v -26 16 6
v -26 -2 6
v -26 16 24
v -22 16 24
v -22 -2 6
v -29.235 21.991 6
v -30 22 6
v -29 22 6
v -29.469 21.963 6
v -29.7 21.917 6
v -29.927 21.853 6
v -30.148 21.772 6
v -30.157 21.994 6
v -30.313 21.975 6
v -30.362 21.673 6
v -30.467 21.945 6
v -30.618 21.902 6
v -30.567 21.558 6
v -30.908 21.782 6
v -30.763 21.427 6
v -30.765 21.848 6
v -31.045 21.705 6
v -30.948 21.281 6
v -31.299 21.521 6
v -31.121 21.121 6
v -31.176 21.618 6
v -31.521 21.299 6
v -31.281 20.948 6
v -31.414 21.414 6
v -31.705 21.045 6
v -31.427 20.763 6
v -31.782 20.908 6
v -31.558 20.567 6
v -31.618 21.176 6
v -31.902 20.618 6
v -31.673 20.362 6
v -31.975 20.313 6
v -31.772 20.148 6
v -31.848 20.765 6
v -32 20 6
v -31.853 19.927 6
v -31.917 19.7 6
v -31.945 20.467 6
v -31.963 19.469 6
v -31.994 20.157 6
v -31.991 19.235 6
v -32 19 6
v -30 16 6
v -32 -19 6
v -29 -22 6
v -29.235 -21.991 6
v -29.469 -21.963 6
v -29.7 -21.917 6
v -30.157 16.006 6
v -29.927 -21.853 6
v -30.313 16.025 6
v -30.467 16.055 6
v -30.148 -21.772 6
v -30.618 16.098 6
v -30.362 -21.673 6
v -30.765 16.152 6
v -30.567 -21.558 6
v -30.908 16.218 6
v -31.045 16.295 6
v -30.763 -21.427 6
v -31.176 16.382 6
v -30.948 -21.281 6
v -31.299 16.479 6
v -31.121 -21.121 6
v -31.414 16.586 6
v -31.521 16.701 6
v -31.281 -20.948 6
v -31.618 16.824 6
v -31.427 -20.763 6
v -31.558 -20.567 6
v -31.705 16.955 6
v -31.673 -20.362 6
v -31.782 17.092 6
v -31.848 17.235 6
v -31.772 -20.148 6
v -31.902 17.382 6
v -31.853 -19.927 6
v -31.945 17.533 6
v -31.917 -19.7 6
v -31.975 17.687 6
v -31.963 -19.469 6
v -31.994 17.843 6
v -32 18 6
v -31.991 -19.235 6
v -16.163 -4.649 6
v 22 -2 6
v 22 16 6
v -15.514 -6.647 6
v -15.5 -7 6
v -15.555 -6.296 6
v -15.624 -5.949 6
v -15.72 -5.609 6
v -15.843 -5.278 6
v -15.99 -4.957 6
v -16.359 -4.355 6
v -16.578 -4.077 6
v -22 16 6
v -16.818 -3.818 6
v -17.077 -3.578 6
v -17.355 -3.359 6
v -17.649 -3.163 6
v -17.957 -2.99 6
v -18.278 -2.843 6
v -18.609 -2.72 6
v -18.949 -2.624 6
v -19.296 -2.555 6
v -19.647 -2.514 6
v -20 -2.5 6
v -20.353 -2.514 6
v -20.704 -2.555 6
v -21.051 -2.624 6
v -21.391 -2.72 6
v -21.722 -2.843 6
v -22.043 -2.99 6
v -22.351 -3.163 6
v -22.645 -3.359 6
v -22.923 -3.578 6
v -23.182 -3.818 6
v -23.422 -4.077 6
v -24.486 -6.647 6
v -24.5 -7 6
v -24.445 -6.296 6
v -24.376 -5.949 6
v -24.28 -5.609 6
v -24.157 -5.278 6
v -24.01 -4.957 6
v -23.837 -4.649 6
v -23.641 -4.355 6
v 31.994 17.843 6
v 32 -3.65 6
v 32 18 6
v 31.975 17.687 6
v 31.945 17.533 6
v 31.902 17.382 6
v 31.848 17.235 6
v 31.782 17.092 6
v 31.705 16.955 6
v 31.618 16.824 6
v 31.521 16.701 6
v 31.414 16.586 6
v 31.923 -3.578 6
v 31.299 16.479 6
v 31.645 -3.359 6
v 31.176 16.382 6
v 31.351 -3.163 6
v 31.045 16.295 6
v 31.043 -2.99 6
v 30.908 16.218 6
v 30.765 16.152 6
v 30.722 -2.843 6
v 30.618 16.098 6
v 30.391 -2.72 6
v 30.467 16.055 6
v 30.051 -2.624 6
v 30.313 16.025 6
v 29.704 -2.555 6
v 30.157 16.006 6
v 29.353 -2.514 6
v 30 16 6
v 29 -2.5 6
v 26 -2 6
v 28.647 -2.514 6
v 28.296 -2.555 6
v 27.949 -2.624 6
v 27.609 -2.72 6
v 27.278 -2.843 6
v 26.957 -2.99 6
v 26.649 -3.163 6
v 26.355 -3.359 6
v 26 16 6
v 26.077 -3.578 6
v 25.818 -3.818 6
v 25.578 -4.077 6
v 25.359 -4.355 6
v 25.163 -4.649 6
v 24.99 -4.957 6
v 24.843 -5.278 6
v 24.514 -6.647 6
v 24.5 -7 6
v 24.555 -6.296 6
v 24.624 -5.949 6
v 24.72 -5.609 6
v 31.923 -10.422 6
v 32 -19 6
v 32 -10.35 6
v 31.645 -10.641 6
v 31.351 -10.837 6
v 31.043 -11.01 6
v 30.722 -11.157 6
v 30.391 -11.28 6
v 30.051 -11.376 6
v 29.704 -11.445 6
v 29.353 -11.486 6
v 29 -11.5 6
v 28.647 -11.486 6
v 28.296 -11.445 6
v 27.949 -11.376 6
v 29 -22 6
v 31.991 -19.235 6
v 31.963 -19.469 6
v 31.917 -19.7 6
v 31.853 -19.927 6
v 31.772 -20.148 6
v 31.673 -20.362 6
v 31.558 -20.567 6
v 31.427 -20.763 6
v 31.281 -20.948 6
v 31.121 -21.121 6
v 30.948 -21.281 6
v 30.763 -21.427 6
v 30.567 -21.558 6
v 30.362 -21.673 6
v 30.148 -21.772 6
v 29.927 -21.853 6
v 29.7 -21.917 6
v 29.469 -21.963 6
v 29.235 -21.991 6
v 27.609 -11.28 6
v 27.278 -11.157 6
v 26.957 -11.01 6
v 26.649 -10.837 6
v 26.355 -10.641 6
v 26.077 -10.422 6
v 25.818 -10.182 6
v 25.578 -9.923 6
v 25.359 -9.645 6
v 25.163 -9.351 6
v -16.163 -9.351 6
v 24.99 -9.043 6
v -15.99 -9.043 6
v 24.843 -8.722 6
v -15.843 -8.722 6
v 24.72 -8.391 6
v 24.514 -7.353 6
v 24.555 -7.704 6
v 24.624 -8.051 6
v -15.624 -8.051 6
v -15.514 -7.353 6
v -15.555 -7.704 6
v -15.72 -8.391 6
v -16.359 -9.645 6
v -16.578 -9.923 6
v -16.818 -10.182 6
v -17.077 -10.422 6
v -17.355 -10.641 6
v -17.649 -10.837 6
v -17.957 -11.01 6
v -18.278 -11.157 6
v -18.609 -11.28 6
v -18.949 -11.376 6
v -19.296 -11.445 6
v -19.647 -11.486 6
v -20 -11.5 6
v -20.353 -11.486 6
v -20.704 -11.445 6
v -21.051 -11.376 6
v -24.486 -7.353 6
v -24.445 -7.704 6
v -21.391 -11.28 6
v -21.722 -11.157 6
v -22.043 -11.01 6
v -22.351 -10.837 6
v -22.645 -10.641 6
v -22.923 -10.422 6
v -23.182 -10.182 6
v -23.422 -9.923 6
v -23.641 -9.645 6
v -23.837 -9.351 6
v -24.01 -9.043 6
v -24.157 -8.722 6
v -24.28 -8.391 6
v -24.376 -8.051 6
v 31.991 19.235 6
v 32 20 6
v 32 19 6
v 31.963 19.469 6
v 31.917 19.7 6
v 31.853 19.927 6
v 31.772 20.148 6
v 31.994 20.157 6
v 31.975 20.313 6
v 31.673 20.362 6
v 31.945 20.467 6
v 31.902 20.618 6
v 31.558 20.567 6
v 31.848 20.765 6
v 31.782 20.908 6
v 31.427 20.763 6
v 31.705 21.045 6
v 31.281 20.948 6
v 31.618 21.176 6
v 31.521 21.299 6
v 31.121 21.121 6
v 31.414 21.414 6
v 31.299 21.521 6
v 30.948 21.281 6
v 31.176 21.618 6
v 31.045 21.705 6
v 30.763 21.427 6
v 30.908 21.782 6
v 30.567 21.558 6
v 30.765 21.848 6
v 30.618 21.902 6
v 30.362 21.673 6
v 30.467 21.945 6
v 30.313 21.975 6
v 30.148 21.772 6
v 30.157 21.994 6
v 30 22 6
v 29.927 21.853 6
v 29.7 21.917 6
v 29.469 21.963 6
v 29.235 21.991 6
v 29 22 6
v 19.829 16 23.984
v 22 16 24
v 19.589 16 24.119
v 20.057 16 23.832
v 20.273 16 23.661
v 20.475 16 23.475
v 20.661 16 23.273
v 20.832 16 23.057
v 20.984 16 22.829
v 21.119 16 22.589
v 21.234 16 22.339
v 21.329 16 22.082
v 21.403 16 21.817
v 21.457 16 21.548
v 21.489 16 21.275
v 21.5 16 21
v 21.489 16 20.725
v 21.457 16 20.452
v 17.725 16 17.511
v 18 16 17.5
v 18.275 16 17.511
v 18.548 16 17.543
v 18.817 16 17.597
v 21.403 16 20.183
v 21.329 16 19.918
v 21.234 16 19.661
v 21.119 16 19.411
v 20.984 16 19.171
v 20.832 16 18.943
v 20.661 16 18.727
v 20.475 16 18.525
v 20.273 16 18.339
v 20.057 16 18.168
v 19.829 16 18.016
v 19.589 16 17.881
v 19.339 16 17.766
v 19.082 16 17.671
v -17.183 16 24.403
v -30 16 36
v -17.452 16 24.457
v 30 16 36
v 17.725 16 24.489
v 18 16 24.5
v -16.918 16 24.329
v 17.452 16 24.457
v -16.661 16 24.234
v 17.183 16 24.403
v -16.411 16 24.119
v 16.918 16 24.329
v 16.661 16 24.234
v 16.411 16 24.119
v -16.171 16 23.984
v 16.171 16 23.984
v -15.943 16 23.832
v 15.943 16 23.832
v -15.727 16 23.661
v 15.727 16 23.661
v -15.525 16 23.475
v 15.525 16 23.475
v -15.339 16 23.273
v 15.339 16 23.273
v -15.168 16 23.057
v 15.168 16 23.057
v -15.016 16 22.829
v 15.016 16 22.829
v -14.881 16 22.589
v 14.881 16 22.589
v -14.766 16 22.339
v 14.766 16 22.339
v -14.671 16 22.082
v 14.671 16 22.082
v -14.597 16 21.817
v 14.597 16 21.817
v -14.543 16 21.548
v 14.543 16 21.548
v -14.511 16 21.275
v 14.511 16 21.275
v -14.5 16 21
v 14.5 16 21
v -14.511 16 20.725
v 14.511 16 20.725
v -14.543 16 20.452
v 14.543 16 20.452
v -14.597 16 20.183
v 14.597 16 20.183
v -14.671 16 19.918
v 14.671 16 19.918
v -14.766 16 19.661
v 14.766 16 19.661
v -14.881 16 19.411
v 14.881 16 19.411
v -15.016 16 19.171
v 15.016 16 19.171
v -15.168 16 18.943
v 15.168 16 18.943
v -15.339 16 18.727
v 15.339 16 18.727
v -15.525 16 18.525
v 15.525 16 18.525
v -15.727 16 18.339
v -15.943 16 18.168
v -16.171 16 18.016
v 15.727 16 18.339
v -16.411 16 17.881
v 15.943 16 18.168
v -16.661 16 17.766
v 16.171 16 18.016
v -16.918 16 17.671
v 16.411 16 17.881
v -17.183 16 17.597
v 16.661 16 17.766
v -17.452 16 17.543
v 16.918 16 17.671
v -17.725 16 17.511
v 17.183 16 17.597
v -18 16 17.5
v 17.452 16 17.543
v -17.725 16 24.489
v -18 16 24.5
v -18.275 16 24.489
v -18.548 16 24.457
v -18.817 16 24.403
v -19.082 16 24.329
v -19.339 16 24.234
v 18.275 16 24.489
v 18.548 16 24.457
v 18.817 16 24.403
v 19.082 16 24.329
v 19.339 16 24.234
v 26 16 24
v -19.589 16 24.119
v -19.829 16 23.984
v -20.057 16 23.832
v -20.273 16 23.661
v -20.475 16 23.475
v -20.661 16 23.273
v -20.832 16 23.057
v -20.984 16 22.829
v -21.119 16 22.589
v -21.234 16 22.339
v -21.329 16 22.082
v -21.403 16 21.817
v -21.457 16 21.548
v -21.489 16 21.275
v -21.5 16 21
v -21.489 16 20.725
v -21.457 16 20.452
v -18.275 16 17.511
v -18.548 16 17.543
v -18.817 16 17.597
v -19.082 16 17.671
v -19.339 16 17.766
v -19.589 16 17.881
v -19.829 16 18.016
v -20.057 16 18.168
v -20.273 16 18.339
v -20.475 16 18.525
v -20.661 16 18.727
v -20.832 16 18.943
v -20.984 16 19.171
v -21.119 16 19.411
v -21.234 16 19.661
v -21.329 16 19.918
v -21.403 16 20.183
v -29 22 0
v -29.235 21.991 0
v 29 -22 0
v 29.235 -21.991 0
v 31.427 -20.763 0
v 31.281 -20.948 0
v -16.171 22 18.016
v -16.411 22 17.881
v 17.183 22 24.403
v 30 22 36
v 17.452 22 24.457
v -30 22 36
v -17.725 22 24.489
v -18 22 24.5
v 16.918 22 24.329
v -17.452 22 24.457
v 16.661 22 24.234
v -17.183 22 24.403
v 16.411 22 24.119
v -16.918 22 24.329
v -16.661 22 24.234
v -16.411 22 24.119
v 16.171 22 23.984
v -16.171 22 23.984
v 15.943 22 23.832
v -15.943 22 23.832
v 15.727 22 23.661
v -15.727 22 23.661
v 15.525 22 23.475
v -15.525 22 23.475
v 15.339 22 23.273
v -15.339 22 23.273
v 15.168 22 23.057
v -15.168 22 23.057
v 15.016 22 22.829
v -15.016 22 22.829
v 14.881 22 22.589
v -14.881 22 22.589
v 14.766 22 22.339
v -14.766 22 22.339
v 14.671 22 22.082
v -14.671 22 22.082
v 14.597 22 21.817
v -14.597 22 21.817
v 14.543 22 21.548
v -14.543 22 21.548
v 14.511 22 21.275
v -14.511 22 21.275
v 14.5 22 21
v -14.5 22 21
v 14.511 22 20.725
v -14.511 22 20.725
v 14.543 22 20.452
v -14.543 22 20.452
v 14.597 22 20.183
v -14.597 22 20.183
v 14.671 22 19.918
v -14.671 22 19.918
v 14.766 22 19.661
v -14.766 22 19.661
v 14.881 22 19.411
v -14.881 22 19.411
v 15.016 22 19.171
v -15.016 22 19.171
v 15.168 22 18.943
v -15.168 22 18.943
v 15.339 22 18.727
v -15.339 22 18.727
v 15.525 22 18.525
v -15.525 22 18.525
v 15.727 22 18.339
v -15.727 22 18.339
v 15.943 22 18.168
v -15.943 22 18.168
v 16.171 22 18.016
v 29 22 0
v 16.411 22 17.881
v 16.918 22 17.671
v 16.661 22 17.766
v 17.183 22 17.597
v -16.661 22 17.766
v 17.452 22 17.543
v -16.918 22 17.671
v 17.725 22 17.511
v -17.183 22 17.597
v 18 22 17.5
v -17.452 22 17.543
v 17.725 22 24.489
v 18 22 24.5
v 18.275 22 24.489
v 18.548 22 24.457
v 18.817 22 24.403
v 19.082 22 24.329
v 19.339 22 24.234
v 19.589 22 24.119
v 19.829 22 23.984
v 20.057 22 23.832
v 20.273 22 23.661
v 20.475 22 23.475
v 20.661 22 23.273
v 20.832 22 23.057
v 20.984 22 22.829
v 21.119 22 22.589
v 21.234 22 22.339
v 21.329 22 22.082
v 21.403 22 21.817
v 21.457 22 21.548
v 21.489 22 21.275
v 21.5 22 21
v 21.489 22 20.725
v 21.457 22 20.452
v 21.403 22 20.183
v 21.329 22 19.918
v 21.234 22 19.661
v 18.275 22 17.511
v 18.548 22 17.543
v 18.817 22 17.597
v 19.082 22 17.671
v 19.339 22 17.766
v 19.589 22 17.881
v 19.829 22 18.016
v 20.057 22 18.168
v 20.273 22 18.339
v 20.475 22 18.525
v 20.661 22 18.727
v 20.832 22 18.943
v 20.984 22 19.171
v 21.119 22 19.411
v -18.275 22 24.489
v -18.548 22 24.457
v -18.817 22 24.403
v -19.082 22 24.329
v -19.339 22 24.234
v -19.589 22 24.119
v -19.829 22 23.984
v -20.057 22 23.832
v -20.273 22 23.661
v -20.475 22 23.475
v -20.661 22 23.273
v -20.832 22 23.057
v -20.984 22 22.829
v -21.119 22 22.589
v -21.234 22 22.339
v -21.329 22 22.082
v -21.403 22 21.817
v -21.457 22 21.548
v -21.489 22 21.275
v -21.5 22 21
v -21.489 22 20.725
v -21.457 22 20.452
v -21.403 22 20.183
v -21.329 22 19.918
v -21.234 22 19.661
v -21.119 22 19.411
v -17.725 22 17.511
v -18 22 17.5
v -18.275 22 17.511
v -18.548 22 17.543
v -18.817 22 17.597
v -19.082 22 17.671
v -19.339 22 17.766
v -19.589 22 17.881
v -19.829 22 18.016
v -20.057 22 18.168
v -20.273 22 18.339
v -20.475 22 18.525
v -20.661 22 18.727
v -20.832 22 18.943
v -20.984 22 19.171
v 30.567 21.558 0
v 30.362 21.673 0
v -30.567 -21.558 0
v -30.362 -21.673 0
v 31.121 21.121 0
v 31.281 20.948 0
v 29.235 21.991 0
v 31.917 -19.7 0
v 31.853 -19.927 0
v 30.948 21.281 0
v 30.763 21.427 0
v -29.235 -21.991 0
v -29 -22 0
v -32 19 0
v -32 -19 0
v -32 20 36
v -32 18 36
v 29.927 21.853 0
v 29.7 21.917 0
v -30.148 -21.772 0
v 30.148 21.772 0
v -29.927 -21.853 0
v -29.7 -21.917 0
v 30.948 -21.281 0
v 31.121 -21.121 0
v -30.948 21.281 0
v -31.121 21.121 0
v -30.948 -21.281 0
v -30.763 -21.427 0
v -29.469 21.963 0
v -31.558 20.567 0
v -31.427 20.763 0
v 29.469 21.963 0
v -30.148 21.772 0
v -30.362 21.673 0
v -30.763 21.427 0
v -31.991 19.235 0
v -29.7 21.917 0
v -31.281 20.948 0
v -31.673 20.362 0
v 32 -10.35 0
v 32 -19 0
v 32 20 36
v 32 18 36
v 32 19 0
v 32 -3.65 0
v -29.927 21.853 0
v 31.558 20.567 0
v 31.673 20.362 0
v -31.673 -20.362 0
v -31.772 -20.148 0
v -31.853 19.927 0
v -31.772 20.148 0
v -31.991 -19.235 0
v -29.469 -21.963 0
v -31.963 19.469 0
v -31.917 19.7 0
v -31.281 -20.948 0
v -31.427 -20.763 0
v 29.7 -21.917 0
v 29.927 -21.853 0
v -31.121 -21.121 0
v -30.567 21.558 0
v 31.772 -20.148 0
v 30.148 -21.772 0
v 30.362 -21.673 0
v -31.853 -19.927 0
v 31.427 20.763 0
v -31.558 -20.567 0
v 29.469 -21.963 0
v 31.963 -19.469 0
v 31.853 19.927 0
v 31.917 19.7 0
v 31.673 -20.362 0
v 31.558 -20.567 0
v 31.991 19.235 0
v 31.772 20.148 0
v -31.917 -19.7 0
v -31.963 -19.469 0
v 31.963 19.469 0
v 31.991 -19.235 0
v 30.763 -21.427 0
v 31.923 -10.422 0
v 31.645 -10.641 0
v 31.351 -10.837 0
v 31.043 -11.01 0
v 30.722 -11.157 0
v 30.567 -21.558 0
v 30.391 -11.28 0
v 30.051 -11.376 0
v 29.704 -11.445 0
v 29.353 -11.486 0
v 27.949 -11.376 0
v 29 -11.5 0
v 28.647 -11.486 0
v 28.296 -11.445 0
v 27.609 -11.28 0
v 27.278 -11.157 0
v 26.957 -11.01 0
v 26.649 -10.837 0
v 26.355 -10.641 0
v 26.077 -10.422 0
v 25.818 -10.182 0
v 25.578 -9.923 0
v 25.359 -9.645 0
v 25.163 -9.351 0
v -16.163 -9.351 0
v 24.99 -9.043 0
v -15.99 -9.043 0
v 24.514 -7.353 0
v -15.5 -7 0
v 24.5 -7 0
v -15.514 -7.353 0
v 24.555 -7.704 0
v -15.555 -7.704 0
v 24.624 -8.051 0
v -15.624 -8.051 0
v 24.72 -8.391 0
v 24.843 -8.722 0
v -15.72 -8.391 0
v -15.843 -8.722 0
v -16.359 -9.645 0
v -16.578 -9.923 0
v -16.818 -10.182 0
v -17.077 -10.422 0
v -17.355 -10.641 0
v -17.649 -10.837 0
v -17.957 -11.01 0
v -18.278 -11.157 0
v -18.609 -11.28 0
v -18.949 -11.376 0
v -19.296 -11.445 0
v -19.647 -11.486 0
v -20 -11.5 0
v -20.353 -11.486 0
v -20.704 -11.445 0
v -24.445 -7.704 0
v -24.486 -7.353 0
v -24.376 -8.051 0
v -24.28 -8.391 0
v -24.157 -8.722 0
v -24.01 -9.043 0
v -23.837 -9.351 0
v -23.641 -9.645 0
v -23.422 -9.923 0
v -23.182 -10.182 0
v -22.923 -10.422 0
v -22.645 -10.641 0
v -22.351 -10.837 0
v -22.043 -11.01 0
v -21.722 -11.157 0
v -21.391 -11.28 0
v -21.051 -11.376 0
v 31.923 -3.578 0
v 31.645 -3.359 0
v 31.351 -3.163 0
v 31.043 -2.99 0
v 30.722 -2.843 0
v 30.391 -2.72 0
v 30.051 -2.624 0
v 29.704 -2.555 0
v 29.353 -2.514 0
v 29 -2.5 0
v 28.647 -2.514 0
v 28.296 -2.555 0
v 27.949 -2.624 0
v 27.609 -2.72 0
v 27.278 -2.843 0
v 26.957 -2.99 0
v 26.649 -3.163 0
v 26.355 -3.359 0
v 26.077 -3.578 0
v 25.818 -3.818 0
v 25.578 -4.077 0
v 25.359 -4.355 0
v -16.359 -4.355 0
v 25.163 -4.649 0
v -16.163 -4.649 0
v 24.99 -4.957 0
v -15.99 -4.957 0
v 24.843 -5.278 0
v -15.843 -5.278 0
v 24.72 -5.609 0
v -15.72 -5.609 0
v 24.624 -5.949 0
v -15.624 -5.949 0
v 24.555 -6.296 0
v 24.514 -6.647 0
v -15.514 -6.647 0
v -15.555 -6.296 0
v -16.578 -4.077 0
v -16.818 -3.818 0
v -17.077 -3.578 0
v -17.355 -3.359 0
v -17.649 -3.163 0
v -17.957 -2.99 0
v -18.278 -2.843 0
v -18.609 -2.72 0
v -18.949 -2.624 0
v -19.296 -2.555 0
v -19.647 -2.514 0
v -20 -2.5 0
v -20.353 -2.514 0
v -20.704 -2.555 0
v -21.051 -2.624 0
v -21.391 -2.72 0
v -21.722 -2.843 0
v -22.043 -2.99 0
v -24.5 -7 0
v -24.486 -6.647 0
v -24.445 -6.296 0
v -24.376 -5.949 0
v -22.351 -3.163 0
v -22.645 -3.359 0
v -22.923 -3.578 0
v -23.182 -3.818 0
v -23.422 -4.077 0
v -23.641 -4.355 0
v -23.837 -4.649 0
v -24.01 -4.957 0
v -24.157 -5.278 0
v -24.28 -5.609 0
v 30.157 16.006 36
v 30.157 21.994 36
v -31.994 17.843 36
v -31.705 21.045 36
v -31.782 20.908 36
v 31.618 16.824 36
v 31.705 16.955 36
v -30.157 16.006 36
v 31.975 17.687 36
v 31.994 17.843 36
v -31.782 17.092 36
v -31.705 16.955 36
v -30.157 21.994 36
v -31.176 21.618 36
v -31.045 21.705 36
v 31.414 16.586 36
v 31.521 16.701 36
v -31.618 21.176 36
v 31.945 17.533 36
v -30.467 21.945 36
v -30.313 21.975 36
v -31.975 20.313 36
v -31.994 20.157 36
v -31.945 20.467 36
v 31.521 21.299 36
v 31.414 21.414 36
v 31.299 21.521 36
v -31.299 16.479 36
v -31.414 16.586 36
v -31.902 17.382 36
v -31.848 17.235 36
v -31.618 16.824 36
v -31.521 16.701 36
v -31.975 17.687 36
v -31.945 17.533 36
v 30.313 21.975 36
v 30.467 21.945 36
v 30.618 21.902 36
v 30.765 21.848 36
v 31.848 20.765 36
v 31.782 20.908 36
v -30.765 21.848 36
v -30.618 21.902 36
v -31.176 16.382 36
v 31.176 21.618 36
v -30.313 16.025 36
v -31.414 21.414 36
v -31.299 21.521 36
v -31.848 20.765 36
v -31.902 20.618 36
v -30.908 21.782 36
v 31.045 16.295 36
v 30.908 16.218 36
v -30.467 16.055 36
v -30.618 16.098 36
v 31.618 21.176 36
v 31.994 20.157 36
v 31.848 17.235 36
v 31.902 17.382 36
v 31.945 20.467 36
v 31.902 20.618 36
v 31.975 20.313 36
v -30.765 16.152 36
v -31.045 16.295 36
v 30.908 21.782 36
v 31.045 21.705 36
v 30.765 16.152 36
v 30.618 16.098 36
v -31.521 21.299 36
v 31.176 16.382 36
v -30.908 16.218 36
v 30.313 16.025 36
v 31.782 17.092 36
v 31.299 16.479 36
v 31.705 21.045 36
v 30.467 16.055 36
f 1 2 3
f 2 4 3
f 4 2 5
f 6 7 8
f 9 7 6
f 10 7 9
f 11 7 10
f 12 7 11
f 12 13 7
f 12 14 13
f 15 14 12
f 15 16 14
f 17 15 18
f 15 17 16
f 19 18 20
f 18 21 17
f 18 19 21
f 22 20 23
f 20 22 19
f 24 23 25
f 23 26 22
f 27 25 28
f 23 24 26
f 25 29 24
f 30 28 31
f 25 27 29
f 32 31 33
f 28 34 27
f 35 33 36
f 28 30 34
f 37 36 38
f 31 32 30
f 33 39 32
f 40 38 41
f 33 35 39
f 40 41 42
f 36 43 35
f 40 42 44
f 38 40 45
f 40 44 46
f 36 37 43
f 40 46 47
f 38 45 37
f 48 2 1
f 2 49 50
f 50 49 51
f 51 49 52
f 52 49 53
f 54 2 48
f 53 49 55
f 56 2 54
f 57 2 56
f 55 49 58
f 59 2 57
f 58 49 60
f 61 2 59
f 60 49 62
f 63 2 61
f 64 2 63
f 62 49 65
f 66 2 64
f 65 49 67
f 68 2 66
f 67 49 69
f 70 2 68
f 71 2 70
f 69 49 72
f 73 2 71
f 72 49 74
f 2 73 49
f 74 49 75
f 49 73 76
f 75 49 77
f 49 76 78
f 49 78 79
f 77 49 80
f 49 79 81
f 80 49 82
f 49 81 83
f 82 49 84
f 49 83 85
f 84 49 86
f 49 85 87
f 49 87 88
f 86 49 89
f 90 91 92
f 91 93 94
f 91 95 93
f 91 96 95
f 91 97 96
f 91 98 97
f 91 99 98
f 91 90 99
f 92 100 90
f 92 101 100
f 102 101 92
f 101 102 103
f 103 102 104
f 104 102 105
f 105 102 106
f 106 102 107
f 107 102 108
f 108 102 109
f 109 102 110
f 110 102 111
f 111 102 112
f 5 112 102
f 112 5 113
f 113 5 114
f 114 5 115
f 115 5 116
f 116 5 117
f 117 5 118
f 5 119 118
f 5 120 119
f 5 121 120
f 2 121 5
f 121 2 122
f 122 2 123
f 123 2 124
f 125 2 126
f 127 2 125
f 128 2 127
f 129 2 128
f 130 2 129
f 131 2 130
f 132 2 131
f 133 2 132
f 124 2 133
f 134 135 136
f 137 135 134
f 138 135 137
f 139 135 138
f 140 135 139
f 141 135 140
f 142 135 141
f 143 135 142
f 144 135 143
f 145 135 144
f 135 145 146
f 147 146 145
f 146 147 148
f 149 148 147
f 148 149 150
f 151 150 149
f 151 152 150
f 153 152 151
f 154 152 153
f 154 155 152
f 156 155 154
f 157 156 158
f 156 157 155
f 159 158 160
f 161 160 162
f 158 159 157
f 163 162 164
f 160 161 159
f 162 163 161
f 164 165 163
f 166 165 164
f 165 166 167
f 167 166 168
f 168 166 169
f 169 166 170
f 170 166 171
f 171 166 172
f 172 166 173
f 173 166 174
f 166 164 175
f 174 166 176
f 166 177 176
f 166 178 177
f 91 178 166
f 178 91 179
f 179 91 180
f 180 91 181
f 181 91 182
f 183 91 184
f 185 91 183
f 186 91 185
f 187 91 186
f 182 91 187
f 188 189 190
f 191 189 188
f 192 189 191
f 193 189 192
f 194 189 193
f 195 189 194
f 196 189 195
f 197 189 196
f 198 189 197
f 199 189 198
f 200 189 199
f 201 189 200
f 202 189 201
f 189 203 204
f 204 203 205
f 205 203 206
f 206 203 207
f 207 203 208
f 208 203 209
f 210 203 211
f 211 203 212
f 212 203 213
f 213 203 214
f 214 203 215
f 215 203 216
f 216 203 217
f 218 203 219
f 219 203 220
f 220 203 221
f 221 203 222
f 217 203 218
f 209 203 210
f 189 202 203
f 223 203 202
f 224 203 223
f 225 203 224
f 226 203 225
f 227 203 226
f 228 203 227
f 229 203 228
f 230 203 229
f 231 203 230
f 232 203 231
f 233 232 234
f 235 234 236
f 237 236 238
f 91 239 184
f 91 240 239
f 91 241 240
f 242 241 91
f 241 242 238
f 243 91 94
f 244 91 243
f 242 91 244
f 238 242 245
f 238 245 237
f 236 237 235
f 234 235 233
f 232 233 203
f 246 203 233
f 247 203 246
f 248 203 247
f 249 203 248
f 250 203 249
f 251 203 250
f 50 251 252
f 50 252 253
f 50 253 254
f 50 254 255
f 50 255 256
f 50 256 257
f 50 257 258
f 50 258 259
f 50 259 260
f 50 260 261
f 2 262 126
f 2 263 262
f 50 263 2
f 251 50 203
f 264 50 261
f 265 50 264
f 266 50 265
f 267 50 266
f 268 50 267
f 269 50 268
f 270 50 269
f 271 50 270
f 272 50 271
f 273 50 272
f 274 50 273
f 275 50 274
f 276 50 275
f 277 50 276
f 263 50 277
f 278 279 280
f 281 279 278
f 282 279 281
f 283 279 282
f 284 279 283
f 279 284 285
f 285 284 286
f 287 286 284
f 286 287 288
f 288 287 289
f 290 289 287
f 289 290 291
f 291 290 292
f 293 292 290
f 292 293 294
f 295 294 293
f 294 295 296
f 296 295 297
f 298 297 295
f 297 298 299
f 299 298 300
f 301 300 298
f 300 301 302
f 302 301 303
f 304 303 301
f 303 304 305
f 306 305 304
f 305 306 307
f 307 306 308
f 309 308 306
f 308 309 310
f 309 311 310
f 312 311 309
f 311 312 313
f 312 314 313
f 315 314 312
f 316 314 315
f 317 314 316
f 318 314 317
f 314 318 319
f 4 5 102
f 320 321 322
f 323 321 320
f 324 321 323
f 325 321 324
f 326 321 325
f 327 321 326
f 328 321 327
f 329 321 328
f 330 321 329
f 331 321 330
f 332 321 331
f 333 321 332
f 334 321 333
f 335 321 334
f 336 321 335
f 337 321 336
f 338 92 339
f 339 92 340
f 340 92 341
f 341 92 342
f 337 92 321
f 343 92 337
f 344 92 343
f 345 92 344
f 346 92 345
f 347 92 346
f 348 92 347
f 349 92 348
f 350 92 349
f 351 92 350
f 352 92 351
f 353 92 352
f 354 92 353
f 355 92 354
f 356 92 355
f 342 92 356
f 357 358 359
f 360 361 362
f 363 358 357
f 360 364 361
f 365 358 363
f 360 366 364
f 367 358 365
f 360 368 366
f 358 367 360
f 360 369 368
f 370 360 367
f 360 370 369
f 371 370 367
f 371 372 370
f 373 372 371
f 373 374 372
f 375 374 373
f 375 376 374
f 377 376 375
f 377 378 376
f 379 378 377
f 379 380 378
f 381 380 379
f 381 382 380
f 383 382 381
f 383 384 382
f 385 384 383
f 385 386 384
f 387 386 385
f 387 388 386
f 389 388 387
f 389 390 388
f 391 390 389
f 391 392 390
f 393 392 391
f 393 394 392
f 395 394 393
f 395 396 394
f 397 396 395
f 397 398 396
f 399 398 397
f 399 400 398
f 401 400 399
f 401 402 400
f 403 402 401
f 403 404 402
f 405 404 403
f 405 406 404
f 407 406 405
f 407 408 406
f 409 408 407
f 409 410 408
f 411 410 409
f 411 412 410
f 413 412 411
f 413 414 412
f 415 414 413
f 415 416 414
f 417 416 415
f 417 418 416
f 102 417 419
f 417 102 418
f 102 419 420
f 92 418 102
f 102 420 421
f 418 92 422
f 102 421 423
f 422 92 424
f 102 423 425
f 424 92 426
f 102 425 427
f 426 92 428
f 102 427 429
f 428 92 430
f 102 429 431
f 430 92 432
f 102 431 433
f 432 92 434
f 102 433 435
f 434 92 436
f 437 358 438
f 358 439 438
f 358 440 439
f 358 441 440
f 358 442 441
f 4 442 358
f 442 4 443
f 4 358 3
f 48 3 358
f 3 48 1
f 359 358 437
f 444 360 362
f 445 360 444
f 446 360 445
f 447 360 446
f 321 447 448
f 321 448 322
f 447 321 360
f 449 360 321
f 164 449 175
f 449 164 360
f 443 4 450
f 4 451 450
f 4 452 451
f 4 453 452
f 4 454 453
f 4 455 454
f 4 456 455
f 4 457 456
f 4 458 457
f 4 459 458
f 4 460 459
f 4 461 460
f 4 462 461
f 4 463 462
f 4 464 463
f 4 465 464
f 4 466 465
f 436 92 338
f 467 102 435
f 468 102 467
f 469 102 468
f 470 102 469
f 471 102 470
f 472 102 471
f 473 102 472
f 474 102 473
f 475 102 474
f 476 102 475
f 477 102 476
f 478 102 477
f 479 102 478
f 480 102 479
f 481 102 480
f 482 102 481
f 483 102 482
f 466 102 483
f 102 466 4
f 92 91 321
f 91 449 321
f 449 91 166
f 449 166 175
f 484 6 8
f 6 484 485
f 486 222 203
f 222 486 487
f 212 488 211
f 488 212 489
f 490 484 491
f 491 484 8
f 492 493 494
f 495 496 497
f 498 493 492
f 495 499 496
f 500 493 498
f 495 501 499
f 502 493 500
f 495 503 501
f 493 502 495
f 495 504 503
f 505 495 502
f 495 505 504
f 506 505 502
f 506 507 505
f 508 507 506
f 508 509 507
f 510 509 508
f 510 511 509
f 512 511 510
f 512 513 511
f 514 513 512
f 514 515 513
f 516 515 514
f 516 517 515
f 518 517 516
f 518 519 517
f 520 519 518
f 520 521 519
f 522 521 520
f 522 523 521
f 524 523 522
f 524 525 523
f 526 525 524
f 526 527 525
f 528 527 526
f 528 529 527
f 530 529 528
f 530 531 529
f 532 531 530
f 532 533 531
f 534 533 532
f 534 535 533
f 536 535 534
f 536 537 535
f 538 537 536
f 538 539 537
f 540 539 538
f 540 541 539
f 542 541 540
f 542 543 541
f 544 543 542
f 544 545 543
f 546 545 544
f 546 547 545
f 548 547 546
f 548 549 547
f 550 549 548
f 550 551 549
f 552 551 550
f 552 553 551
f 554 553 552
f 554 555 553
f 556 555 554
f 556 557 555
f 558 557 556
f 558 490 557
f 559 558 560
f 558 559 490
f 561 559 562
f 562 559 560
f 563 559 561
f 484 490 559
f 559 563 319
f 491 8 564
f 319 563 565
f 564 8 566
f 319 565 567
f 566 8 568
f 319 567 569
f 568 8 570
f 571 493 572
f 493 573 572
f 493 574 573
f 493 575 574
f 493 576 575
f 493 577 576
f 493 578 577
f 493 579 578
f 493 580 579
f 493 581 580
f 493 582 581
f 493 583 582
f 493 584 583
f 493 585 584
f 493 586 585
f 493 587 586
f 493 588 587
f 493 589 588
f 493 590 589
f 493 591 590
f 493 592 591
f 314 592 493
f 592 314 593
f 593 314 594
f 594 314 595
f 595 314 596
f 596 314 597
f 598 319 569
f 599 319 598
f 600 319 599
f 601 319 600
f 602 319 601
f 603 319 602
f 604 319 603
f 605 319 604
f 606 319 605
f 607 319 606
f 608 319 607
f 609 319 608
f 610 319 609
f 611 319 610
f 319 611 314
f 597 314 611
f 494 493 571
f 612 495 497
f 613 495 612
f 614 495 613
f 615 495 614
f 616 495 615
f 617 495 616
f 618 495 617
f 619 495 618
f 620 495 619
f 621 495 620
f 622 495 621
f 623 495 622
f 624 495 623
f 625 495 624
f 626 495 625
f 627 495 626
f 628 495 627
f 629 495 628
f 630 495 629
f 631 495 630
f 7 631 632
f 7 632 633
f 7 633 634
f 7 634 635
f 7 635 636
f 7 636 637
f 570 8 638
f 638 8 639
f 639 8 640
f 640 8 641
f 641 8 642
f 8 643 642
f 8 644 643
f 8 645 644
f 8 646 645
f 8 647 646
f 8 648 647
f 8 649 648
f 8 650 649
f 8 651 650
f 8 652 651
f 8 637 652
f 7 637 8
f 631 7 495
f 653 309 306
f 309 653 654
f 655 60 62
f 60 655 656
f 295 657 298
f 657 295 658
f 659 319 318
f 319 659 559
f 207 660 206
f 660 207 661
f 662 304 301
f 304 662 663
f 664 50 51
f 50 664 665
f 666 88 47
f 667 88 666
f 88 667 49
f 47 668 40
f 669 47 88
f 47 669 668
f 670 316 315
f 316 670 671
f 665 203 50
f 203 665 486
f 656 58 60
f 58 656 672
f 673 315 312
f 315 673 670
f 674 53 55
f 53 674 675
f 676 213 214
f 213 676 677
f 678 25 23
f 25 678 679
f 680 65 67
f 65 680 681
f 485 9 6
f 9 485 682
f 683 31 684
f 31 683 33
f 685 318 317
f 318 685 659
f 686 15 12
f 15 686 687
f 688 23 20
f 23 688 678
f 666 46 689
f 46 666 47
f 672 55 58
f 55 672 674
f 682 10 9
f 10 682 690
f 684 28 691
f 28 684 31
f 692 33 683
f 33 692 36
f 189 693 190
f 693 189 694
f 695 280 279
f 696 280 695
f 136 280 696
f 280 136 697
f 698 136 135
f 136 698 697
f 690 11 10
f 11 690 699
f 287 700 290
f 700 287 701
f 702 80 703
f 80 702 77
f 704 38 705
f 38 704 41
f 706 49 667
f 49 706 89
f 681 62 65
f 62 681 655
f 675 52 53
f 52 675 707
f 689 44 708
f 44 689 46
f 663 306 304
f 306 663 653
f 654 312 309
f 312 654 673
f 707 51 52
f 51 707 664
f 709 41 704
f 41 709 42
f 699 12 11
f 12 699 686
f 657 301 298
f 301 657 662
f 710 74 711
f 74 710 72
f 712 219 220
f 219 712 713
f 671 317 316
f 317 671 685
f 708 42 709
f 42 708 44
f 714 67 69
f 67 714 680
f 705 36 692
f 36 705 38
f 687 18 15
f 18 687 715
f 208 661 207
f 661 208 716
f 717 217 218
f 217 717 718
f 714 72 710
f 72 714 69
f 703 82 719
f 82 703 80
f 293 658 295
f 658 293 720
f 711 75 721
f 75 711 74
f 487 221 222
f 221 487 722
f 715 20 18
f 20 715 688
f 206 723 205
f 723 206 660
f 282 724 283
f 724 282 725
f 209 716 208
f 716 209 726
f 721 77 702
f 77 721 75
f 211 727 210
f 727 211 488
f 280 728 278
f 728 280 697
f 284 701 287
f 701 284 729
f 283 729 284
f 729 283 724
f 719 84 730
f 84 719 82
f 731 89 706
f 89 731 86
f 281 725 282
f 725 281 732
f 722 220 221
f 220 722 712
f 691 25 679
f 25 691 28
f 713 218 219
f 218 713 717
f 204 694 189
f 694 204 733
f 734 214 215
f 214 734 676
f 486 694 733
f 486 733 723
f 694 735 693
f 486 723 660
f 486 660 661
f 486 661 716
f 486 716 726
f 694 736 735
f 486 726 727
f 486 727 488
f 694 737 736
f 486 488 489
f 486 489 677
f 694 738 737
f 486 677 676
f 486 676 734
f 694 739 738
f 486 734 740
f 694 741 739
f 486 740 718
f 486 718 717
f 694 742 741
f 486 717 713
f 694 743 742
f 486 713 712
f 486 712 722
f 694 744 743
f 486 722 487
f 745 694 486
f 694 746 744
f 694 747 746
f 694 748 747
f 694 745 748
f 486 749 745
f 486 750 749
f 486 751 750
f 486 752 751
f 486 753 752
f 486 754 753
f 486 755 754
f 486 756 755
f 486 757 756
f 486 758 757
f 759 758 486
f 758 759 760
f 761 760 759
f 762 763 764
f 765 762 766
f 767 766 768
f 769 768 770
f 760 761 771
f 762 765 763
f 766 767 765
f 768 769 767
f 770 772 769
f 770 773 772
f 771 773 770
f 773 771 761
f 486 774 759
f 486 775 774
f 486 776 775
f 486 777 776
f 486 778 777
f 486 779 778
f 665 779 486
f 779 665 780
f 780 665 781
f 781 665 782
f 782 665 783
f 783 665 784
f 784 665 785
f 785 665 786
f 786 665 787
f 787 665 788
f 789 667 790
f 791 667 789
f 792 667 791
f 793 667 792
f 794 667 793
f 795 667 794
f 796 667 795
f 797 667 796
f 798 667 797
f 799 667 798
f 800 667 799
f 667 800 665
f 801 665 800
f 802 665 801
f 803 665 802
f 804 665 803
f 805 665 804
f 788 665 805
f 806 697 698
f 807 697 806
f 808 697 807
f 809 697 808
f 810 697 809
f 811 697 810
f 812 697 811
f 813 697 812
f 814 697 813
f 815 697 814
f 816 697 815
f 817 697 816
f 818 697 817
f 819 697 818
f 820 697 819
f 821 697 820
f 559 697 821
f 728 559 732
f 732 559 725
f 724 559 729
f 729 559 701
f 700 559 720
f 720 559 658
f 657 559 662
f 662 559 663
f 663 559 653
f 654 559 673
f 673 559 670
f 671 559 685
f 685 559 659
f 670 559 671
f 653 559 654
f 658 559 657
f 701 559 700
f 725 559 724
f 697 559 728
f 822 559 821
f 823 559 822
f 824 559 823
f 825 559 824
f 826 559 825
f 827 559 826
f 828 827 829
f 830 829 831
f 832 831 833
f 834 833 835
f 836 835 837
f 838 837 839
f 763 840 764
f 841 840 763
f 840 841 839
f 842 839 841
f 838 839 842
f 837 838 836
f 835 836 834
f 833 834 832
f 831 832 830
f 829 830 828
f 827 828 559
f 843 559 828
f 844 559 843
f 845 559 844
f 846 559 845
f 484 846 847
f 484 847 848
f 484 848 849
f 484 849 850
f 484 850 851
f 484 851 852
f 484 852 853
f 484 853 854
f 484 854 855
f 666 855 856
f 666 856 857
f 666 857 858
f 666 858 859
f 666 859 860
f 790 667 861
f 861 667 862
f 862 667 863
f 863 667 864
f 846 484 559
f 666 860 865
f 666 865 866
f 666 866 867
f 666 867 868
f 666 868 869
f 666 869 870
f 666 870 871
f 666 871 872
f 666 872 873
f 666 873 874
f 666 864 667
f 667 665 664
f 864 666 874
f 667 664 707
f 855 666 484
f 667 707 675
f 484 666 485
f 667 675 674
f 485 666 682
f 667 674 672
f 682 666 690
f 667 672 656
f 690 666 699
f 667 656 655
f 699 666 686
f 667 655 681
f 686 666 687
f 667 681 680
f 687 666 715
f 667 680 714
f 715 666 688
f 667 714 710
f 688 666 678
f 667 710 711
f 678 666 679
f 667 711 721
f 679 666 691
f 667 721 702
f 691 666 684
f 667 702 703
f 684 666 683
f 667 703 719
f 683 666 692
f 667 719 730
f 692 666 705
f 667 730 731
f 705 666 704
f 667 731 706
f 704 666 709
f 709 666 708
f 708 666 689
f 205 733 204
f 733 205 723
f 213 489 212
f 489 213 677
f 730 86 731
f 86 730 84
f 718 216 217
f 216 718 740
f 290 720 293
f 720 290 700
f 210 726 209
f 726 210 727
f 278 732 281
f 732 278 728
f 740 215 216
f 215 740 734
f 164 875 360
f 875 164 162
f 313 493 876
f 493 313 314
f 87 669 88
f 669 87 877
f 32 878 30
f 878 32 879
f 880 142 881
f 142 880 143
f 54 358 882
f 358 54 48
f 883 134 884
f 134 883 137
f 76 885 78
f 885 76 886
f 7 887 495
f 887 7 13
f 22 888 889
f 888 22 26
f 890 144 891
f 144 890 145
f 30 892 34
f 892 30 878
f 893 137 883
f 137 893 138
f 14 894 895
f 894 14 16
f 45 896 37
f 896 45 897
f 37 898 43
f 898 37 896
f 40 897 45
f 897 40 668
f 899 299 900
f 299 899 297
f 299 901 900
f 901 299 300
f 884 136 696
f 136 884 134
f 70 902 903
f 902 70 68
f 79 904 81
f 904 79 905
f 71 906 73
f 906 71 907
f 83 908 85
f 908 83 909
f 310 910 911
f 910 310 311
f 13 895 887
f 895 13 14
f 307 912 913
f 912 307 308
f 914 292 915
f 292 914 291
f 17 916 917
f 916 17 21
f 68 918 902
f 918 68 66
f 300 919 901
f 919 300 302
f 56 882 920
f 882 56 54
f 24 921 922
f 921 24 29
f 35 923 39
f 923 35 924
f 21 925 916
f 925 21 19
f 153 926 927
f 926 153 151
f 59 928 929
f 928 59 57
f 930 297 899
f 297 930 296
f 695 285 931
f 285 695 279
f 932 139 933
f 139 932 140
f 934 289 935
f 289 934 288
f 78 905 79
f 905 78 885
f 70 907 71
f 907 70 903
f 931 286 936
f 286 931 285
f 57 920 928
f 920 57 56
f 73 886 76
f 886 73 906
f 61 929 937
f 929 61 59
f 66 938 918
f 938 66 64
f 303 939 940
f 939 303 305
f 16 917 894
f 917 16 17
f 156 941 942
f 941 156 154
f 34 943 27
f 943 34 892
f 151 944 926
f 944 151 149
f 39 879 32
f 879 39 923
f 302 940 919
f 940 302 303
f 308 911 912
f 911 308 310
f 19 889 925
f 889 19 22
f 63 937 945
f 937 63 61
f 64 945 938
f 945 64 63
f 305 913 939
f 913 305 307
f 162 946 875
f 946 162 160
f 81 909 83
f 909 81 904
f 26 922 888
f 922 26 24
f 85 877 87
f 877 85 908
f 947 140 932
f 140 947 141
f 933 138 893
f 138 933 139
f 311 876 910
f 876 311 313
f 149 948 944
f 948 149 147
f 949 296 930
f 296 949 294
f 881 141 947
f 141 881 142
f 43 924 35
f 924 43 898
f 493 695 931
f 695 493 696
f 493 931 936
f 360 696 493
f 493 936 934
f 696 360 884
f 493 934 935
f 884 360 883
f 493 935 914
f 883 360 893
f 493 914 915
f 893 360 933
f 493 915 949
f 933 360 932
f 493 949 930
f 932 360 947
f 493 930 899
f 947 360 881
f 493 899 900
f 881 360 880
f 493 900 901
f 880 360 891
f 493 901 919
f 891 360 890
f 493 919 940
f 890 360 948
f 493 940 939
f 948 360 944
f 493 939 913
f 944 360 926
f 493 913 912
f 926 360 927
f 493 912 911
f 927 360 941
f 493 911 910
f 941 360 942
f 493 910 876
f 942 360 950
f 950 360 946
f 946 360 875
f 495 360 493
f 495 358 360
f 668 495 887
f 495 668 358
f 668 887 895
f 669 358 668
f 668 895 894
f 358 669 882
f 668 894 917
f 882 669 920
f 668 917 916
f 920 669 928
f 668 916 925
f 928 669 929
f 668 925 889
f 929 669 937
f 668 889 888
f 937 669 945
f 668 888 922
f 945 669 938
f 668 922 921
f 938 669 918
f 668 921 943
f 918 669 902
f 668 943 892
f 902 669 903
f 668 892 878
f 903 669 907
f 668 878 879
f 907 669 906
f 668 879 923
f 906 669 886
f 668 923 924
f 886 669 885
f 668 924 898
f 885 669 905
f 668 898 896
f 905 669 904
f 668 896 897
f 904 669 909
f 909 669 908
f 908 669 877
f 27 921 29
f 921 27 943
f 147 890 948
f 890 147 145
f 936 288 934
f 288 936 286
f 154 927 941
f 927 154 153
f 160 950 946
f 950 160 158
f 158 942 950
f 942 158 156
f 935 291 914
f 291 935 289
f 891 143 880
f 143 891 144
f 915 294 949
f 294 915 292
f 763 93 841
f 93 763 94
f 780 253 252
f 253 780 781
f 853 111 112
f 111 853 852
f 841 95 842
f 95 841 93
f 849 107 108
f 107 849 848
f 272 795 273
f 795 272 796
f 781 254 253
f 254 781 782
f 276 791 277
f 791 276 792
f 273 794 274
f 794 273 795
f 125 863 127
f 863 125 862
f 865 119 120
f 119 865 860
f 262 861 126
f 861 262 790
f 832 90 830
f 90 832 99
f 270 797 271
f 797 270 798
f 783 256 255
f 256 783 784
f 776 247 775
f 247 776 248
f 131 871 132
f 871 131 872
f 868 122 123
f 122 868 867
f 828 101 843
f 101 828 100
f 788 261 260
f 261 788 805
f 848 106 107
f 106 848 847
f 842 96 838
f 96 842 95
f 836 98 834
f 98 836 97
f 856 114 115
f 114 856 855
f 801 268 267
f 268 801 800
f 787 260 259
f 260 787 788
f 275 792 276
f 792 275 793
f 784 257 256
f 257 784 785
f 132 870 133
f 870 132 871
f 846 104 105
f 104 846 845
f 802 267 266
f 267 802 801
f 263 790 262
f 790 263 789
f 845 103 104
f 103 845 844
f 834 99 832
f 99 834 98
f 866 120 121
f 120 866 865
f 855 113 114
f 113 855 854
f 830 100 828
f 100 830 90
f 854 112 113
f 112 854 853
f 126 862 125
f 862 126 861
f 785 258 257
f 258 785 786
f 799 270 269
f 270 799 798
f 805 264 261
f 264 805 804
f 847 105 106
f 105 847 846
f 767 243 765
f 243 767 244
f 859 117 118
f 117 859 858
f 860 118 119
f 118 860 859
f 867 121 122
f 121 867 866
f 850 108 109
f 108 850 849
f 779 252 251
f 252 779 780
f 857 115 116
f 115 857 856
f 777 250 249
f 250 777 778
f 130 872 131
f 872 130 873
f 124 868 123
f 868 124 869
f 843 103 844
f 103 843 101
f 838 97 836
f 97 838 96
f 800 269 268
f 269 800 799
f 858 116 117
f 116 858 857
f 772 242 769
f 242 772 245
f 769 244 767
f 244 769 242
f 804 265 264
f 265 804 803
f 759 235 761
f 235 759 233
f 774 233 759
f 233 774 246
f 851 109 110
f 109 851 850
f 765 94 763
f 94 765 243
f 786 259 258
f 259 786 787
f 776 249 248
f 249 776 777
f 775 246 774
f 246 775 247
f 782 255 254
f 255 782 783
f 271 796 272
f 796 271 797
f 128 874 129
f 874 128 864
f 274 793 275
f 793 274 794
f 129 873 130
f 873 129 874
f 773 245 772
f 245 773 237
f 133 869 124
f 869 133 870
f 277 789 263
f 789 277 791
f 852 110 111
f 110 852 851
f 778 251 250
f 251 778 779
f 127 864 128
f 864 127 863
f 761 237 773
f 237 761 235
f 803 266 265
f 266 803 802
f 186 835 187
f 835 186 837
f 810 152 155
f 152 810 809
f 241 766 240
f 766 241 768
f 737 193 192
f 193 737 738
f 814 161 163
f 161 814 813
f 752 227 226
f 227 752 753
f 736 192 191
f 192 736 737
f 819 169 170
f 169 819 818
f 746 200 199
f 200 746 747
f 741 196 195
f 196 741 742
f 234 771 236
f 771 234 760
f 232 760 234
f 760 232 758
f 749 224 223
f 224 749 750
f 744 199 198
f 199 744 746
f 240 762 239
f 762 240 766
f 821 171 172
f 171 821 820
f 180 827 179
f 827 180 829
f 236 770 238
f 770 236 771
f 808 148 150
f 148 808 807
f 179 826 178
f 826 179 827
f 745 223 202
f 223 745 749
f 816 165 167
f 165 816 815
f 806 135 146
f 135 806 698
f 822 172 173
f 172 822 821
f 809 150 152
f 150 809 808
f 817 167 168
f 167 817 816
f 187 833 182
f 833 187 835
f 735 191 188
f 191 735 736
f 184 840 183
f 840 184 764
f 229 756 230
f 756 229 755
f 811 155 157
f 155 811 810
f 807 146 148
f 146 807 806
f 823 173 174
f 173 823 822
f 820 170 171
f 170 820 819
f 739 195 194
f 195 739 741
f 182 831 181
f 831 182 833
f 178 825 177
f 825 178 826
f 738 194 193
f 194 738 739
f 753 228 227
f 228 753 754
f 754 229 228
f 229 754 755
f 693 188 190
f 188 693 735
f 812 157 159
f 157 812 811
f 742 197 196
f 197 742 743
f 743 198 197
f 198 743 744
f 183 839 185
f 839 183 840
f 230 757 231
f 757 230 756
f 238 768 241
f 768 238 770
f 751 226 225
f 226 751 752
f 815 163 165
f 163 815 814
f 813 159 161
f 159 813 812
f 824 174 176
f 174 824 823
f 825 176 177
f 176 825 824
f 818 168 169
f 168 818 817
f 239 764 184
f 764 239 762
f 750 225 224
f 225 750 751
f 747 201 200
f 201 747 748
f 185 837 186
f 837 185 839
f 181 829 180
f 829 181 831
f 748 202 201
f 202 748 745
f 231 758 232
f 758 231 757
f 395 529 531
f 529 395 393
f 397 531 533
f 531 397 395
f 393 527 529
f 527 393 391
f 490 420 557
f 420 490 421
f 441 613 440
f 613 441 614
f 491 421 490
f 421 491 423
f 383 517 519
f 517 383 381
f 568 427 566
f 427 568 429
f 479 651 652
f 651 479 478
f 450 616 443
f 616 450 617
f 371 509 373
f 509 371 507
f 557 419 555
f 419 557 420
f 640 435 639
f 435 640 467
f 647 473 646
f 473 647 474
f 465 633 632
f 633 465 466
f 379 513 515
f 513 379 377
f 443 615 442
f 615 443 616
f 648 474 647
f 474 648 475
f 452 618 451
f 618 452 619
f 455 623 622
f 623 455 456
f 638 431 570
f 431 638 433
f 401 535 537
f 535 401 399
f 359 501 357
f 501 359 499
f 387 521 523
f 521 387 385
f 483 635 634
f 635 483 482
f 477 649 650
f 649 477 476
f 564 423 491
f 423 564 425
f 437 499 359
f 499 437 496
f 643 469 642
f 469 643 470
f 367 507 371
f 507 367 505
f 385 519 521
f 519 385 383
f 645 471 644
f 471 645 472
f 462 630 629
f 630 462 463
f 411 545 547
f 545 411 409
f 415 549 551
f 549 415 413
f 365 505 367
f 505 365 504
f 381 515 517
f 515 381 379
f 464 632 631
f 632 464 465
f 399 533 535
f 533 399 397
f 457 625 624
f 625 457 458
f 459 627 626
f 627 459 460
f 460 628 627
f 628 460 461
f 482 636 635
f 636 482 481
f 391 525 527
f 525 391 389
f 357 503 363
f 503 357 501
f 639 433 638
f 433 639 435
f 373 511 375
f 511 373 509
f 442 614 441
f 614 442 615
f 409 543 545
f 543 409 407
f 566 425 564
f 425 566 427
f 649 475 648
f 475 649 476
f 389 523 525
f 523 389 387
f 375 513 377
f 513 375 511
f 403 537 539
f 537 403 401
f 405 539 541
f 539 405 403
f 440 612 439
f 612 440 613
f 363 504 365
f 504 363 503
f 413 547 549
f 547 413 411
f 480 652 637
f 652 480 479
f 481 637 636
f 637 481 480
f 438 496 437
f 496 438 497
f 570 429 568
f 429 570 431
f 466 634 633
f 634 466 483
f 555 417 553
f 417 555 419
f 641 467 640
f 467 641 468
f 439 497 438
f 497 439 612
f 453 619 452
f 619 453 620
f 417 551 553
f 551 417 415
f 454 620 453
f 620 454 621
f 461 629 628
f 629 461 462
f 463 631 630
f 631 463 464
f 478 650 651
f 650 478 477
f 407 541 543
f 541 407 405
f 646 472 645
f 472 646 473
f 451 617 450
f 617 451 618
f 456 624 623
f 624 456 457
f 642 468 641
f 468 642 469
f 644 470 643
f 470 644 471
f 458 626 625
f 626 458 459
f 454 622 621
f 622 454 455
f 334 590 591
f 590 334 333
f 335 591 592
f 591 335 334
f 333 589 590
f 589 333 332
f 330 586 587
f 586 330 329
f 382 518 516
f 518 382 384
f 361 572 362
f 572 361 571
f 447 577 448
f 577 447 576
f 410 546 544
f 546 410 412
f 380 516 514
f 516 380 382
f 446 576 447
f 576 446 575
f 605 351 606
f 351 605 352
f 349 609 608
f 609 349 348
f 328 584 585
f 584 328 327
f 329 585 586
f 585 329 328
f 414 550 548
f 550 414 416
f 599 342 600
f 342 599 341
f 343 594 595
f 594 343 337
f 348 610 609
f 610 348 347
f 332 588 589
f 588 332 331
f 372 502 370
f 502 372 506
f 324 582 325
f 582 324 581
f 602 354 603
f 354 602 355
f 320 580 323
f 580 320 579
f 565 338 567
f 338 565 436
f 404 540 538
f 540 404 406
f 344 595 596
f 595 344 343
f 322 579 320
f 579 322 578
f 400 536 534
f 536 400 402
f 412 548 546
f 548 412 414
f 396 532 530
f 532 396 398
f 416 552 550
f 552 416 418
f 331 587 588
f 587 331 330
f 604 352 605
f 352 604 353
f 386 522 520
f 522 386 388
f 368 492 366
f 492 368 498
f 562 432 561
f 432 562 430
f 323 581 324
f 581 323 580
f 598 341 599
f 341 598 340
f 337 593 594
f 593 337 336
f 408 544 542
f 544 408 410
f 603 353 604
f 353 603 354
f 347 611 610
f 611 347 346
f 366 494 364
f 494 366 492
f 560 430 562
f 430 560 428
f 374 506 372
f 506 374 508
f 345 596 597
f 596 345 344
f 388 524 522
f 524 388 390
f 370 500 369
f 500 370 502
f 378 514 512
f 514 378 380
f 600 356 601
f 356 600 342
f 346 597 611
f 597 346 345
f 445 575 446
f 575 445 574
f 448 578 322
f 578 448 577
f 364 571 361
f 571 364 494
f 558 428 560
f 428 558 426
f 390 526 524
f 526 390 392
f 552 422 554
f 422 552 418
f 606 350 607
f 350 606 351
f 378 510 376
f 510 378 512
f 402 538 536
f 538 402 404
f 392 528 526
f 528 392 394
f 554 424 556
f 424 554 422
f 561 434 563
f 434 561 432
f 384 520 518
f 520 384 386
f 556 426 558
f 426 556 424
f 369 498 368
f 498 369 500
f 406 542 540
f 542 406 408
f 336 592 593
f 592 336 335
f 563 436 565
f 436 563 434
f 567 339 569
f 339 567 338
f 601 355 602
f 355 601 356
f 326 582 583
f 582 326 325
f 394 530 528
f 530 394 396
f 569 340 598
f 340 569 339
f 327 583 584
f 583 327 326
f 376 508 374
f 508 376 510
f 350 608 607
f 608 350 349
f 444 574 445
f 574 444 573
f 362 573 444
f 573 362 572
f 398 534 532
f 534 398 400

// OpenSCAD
// SCADMaxx README demonstration: mounting hole too close to the edge.
/* [Bracket dimensions] */
// Overall base width in millimetres.
base_width = 64; // [50:2:90]
// Overall base depth in millimetres.
base_depth = 44; // [30:2:70]
// Thickness of the base and rear wall.
wall = 6; // [3:1:10]
// Height of the upright mounting face.
back_height = 30; // [20:2:50]
/* [Mounting holes] */
// Diameter of the two base mounting holes.
hole_diameter = 9; // [4:1:12]
// Right hole is intentionally too close to the outer edge.
right_edge_distance = 3; // [2:1:15]
/* [Hidden] */
$fn = 80;
$vpt = [0, 0, 12];
$vpr = [62, 0, 32];
$vpd = 190;
module rounded_plate(w, d, h, r=3) {
    linear_extrude(h)
        offset(r=r) square([w-2*r, d-2*r], center=true);
}
difference() {
    union() {
        rounded_plate(base_width, base_depth, wall);
        translate([0, base_depth/2-wall/2, wall])
            rounded_plate(base_width, wall, back_height, 2);
        for (x=[-base_width/2+8, base_width/2-8])
            translate([x, base_depth/2-wall, wall])
                rotate([0,90,0]) linear_extrude(4, center=true)
                    polygon([[0,0],[-18,0],[0,-18]]);
    }
    for (x=[-base_width/2+12, base_width/2-right_edge_distance])
        translate([x,-7,-1]) cylinder(h=wall+2,d=hole_diameter);
    for (x=[-18,18])
        translate([x,base_depth/2+1,wall+back_height/2])
            rotate([90,0,0]) cylinder(h=wall+2,d=7);
}
